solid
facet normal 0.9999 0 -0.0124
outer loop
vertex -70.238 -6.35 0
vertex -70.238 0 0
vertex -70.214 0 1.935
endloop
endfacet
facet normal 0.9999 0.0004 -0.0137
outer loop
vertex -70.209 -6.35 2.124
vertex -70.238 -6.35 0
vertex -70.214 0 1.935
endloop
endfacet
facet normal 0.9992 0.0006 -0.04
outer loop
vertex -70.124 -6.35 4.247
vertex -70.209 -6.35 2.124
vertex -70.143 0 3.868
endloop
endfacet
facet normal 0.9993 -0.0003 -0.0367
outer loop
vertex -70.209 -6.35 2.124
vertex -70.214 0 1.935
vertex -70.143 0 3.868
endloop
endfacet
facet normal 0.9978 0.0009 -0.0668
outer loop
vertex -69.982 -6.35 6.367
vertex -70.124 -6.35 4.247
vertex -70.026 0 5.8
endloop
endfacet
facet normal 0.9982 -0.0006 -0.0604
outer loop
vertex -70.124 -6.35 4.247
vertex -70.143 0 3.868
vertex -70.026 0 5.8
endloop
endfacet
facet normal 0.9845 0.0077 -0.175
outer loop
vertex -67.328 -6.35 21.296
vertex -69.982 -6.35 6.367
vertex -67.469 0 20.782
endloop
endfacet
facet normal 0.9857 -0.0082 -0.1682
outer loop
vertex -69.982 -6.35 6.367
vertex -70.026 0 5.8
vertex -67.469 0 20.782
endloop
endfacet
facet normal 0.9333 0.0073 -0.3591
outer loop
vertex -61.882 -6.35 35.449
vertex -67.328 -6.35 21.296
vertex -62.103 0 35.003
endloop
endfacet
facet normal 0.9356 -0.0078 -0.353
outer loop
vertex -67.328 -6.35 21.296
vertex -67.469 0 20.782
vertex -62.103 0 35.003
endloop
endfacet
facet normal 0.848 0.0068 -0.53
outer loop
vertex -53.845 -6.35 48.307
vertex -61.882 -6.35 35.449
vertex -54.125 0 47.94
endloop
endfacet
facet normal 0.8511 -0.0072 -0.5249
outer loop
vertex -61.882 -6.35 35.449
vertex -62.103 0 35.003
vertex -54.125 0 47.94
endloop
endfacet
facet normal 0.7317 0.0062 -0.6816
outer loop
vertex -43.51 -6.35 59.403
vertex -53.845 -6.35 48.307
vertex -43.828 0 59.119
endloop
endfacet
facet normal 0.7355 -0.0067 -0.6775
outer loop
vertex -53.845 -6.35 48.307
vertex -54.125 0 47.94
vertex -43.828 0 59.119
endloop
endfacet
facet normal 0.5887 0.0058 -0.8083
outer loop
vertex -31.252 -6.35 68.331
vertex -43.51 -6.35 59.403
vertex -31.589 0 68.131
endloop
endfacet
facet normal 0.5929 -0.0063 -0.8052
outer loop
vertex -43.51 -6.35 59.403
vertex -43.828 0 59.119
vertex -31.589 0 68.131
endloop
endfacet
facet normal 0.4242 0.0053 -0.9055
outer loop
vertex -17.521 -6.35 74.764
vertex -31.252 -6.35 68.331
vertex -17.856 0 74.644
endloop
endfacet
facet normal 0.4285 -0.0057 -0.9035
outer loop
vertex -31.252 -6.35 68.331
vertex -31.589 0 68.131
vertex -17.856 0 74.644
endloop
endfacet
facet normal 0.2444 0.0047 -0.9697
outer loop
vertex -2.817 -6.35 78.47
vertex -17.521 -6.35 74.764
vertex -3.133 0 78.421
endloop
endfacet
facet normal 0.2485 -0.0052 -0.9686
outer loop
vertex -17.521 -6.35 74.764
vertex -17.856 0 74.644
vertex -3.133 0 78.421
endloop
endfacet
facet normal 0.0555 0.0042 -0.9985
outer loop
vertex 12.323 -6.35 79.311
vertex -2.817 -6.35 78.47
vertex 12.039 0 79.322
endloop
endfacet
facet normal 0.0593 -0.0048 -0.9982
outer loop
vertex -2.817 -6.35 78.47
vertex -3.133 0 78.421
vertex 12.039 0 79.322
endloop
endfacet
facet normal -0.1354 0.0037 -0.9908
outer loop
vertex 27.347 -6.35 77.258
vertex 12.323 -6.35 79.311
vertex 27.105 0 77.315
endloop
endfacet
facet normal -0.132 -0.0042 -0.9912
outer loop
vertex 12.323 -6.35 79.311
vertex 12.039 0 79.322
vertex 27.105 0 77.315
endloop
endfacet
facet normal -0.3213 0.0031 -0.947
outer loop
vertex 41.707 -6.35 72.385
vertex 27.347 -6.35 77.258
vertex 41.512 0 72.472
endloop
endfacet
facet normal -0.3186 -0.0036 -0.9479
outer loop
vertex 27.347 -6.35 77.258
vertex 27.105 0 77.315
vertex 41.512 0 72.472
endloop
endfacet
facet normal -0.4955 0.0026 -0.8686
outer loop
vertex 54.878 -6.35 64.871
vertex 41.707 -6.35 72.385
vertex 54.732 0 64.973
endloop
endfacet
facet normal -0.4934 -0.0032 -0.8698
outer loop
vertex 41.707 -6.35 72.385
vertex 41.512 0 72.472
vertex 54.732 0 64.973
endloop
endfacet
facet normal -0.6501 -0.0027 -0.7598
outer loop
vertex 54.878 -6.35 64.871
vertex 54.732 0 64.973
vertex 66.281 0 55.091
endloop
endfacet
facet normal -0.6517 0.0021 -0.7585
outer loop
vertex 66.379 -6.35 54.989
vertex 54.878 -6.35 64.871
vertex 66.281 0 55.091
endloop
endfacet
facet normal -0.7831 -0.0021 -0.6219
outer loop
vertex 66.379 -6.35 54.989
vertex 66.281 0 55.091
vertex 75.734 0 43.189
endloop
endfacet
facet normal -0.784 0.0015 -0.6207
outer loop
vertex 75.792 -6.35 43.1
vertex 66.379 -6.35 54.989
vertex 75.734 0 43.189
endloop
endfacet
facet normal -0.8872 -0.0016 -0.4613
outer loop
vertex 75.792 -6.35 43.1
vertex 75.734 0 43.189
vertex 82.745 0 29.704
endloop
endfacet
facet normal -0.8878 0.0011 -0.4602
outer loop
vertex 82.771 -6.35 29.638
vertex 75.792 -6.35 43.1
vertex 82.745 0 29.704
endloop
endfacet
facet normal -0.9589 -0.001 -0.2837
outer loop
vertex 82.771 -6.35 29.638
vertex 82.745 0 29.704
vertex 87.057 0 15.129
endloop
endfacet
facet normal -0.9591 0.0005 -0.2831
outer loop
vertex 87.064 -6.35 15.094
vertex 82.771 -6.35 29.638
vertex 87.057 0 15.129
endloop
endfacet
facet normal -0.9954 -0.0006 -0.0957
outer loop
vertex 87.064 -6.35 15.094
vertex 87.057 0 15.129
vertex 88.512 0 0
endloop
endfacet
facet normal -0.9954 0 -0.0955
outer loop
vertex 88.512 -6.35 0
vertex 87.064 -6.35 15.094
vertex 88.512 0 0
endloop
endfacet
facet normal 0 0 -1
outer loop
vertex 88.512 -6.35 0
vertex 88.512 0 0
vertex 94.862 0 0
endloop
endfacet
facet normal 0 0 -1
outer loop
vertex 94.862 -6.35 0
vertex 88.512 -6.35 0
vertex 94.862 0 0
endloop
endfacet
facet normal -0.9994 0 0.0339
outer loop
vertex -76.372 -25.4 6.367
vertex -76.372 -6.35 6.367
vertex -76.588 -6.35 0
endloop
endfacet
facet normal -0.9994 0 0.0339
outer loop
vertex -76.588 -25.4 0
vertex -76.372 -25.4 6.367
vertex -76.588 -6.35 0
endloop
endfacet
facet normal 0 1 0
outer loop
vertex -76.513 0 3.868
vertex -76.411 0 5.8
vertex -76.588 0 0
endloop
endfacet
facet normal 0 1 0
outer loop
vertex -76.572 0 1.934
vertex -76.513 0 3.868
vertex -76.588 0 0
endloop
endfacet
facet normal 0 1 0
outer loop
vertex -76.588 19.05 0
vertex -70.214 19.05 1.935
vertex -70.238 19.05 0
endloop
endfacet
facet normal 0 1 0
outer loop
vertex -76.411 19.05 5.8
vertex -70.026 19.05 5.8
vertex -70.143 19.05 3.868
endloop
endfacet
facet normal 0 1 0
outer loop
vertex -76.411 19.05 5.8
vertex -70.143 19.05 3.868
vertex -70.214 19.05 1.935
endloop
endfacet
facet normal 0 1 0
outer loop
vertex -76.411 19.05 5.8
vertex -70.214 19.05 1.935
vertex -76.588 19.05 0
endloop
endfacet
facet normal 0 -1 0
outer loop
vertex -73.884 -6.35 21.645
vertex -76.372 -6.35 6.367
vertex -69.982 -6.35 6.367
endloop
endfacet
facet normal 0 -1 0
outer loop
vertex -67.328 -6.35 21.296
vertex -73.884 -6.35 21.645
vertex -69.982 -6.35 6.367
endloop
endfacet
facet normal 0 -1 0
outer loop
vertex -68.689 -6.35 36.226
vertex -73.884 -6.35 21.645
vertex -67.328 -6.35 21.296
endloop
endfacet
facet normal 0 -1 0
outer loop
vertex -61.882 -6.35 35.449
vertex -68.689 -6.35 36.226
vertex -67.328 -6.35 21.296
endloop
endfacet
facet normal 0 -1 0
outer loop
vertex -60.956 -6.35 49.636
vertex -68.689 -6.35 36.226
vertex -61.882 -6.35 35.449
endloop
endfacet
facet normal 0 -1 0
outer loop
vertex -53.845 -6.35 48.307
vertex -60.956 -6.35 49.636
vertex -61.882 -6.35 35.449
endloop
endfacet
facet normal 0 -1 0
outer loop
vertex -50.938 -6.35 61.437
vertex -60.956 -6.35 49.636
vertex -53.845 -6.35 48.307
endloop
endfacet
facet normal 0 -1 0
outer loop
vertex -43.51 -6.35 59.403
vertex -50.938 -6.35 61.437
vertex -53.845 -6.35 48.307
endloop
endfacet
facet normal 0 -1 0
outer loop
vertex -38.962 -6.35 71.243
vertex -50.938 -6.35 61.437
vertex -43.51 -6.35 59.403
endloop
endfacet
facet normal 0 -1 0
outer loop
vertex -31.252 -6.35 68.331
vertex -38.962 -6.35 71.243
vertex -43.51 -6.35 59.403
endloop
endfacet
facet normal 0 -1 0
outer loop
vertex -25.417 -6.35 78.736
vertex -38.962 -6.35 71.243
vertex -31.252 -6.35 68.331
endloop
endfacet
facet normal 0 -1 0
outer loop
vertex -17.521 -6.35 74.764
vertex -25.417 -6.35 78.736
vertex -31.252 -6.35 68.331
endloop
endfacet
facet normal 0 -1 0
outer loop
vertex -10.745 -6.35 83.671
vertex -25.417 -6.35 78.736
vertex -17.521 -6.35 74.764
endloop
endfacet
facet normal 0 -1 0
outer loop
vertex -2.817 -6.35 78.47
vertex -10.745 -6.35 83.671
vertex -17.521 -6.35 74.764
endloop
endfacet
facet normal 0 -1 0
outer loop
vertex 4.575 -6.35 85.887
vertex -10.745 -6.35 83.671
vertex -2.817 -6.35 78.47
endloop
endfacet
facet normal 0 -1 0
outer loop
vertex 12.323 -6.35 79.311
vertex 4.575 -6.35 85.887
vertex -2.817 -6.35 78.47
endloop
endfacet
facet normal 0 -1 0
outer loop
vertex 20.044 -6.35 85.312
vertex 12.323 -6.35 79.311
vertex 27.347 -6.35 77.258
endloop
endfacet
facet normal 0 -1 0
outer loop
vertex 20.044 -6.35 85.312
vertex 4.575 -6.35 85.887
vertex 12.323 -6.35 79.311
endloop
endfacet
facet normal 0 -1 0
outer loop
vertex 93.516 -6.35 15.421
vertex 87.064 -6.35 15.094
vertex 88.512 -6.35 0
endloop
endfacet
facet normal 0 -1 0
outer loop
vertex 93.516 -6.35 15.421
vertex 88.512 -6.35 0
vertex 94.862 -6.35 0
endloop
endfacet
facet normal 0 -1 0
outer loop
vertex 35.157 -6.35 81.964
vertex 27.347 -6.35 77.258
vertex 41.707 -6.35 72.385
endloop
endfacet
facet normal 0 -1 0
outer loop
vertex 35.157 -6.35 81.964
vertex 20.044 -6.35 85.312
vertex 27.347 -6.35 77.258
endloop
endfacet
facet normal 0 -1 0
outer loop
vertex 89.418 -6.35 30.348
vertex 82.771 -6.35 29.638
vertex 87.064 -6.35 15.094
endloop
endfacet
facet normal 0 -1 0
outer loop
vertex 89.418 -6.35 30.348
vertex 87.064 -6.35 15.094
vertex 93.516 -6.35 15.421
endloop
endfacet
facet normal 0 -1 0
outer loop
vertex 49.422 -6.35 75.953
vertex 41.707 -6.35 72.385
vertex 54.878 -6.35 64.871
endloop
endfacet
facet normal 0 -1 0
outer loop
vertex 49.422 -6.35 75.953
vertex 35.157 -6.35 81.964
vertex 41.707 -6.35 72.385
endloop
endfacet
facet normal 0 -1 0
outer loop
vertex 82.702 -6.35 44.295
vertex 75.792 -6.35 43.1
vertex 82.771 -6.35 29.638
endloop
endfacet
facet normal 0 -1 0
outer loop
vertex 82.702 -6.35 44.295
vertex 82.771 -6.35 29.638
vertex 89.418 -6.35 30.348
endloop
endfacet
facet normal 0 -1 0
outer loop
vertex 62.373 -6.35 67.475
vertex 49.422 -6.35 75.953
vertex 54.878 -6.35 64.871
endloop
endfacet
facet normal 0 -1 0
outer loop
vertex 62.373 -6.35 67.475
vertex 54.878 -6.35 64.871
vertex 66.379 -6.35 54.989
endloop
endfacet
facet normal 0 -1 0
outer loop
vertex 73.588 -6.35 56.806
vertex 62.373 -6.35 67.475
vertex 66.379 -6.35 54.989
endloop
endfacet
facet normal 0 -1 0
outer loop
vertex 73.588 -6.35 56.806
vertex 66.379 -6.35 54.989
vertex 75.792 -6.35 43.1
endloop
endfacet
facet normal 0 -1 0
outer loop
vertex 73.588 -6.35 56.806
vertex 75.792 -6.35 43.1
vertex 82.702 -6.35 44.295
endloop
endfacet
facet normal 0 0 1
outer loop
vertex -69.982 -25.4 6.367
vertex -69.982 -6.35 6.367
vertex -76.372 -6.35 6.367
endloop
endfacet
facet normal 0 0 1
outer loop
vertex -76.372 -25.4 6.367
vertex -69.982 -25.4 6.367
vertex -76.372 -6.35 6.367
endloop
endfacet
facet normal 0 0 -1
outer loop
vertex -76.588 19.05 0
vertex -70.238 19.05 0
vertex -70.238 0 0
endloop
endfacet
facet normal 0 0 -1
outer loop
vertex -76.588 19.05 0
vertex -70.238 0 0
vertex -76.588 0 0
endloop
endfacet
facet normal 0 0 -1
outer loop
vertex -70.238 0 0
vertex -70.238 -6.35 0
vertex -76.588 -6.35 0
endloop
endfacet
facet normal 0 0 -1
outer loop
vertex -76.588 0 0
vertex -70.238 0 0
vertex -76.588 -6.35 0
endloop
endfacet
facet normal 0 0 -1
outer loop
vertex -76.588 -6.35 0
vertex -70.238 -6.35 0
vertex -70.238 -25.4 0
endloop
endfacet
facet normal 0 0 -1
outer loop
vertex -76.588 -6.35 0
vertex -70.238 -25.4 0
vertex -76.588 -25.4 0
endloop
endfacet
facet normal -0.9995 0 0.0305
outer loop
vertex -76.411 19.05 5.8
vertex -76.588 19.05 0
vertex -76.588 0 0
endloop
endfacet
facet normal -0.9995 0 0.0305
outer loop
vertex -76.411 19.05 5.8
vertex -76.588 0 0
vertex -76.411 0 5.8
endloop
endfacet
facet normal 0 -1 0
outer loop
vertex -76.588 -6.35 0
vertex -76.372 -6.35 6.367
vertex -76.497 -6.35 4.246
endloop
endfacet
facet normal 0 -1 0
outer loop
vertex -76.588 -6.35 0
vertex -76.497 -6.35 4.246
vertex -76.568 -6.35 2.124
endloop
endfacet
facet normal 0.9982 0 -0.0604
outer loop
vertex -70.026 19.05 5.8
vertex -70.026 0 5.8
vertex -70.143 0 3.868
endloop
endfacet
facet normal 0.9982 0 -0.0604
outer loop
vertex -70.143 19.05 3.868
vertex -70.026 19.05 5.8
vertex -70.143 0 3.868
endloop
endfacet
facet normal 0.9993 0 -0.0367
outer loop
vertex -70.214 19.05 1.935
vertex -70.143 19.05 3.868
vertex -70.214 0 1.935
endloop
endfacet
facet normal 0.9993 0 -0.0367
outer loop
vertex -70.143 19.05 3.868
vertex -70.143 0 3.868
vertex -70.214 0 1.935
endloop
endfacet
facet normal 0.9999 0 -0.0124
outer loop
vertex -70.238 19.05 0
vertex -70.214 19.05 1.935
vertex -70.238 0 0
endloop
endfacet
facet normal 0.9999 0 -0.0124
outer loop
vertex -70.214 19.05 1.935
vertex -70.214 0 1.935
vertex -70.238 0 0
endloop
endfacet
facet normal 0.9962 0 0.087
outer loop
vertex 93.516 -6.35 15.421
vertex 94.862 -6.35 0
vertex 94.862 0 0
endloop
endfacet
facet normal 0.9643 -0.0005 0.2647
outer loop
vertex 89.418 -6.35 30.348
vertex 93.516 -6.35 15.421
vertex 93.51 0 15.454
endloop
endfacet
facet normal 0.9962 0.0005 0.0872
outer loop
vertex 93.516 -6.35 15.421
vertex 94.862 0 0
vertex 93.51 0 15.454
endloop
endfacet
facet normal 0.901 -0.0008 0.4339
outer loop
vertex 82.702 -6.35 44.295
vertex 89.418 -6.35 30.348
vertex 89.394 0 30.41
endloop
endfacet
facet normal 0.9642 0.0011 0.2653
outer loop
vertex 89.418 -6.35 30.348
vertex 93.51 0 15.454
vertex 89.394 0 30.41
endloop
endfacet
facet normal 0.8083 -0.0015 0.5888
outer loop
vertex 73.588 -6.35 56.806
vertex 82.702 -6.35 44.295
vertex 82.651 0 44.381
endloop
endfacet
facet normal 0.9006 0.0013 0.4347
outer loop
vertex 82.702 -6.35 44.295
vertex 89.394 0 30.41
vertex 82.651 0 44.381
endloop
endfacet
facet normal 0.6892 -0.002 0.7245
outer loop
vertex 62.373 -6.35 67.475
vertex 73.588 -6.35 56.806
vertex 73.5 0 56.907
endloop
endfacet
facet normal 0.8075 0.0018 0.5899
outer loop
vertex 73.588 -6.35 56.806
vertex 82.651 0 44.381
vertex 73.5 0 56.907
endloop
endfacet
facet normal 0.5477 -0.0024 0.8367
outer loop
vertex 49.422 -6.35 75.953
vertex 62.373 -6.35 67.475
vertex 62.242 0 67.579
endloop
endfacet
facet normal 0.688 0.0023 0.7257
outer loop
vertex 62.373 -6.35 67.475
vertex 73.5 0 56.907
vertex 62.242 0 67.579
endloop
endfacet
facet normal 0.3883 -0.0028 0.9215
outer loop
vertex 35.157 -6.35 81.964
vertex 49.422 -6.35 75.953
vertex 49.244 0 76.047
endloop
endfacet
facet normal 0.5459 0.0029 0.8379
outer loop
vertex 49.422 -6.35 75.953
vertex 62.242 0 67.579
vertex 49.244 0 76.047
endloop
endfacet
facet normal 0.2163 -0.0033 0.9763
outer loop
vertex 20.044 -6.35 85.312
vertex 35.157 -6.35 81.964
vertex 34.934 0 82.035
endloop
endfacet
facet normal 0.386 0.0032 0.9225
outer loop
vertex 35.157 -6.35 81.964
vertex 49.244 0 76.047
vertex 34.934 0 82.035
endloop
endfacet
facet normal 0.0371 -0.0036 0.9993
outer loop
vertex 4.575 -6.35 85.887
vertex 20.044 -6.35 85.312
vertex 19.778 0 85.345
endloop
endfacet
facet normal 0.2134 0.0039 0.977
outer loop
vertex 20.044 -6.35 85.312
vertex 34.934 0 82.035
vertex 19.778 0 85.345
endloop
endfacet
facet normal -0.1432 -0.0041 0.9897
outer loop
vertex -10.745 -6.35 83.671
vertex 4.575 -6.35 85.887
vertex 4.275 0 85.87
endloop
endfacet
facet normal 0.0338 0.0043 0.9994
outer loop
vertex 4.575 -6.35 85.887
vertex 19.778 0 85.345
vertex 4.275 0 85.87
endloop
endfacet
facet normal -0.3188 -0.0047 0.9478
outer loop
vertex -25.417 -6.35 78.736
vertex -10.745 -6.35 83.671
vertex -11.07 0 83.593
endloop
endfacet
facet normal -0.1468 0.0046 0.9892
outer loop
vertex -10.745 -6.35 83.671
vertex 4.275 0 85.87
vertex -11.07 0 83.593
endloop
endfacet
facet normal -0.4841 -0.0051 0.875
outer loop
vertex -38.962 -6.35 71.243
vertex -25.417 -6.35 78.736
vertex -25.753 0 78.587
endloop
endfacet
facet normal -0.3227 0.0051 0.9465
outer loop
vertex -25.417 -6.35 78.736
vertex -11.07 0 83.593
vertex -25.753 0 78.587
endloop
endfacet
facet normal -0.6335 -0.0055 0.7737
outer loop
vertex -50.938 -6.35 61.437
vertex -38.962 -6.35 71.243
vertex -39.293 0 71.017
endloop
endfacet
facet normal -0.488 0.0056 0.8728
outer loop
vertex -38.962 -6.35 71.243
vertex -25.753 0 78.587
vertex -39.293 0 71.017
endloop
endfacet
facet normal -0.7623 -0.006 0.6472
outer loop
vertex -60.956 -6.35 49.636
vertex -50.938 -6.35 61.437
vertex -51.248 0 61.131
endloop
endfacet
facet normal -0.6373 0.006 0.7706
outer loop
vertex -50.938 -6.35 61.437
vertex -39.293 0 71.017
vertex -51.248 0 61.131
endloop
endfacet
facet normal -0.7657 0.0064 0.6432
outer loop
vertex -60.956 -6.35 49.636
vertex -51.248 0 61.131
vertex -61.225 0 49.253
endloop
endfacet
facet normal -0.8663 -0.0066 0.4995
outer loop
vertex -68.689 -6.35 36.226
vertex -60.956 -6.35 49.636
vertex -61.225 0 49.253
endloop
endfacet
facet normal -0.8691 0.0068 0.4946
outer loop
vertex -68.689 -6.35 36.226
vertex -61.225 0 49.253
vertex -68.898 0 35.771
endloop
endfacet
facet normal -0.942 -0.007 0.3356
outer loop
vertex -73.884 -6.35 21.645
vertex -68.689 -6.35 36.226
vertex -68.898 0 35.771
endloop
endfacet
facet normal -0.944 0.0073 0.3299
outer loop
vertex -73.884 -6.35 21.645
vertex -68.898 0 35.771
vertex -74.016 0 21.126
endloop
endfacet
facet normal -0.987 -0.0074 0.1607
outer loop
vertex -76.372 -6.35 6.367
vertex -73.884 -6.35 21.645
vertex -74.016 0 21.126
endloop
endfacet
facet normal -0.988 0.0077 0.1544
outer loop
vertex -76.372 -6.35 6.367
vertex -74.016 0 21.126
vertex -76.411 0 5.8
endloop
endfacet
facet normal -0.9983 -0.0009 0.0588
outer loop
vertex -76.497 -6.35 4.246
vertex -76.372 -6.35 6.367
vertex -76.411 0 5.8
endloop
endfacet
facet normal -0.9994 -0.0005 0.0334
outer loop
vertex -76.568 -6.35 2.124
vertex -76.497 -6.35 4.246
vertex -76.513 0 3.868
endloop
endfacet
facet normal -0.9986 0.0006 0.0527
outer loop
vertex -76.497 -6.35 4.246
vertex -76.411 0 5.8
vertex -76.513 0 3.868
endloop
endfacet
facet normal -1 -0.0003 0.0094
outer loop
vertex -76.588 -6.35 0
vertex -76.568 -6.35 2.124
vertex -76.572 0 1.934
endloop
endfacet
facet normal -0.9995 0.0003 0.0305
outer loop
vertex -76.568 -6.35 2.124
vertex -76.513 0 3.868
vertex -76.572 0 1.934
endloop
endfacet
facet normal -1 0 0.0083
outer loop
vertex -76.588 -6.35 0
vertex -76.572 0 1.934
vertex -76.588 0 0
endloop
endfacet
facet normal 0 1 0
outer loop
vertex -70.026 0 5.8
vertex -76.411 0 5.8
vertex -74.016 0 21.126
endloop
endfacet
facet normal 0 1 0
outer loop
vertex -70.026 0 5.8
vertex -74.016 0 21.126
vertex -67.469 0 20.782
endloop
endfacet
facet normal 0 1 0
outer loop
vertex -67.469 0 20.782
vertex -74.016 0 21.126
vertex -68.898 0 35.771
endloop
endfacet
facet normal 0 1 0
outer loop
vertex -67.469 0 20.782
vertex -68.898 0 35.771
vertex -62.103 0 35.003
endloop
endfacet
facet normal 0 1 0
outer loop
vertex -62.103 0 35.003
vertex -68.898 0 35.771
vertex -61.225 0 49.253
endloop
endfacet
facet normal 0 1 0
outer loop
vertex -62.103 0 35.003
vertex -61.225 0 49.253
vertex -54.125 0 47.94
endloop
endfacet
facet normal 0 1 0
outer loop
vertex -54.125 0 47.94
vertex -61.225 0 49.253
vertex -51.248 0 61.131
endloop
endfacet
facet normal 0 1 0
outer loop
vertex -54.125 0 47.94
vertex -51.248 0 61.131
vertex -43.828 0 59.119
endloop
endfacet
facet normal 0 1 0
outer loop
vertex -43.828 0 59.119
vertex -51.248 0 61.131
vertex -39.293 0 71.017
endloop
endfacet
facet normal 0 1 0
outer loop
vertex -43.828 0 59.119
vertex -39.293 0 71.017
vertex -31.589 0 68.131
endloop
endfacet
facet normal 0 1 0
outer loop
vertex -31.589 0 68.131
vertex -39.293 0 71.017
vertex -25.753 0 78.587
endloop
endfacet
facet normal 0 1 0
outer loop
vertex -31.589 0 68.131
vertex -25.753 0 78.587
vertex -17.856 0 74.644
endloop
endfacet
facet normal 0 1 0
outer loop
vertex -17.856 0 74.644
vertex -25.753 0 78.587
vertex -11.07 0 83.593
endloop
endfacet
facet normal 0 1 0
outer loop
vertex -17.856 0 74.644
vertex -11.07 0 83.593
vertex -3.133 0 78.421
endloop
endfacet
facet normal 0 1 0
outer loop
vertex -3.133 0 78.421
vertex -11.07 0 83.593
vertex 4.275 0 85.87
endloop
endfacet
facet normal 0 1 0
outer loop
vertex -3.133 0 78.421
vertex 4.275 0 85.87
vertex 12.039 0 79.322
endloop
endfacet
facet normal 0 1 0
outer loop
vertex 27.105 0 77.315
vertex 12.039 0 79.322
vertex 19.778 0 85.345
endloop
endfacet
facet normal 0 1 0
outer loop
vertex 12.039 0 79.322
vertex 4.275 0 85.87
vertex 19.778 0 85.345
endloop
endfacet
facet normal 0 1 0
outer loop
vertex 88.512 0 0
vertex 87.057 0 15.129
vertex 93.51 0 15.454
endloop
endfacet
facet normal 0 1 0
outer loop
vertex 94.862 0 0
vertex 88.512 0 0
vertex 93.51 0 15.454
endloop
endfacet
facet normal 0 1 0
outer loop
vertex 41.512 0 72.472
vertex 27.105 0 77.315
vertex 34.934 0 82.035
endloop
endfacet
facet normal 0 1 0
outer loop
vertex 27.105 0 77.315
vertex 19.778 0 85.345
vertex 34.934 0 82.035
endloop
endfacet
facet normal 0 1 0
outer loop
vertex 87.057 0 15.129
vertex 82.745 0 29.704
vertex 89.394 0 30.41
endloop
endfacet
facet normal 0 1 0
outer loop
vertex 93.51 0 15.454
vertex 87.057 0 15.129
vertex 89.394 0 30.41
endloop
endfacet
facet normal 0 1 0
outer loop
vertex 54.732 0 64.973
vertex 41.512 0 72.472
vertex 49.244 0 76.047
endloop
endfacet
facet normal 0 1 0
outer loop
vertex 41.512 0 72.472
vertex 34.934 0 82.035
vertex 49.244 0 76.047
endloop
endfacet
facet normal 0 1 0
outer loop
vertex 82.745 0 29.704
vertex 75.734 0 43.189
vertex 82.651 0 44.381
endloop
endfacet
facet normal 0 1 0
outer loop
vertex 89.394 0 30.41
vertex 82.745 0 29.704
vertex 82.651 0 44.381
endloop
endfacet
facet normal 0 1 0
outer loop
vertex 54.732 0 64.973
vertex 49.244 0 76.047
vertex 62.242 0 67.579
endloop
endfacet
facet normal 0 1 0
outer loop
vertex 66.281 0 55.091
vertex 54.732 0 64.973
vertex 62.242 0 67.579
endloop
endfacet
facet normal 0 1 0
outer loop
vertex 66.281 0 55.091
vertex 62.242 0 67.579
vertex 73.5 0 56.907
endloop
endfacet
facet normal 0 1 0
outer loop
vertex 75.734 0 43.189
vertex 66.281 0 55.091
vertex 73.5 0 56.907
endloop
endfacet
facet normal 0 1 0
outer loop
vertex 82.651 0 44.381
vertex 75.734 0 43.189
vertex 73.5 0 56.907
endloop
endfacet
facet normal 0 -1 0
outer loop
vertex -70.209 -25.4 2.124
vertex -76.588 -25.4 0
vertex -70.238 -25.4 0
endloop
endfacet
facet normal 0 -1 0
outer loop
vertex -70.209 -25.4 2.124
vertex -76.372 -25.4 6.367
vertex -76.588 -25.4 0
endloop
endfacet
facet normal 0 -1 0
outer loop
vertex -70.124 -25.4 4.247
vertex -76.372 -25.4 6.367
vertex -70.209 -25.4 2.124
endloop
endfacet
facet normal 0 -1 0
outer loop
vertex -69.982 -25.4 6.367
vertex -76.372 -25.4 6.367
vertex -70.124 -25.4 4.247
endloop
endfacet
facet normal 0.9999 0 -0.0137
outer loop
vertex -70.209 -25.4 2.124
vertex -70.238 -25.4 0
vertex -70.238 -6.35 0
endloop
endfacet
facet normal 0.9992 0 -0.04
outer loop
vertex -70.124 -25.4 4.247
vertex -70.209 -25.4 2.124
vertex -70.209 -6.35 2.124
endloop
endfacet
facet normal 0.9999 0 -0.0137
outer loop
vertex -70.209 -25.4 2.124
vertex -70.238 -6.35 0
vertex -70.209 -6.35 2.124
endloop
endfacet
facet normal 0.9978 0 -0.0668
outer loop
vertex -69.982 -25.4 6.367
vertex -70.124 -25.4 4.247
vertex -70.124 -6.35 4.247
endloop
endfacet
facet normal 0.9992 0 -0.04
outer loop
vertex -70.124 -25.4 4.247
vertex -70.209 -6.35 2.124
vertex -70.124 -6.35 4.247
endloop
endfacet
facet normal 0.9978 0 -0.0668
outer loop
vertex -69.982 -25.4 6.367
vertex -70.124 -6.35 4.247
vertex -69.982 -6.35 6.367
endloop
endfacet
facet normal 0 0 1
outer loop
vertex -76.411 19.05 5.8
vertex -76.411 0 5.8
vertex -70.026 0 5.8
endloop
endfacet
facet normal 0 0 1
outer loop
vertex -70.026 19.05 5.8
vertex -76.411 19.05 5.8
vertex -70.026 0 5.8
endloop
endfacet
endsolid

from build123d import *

# Parameters (mm, degrees)
F1_DEPTH = 6.35
F3_DEPTH = 19.05
F5_DEPTH = 19.05


with BuildPart() as f1:
    # F0 (on Front) → F1 (new body)
    with BuildSketch(Plane.XZ):
        with BuildLine():
            ThreePointArc((-70.237749294, 0), (9.137250706, 79.375), (88.512250706, 0))
            Line((88.512250706, 0), (94.862250706, 0))
            ThreePointArc((94.862250706, 0), (9.137250706, 86.0083166132), (-76.587749294, 0))
            Line((-76.587749294, 0), (-70.237749294, 0))
        make_face()
    extrude(amount=F1_DEPTH)

    # F2 (on face) → F3 (join)
    with BuildSketch(Plane.XZ.offset(6.35)):
        with BuildLine():
            Line((-76.587749294, 0), (-70.237749294, 0))
            ThreePointArc((-70.237749294, 0), (-70.1737860692, 3.1859175505), (-69.9819994827, 6.3667004474))
            Line((-69.9819994827, 6.3667004474), (-76.3720610245, 6.3667004474))
            Line((-76.3720610245, 6.3667004474), (-76.587749294, 0))
        make_face()
    extrude(amount=F3_DEPTH)

    # F4 (on face) → F5 (join)
    with BuildSketch(Plane(origin=(0, 0, 0), x_dir=(-1, 0, 0), z_dir=(0, 1, 0))):
        with BuildLine():
            ThreePointArc((70.0255849548, 5.7996616405), (70.1846904754, 2.9017705307), (70.237749294, 0))
            Line((70.237749294, 0), (76.587749294, 0))
            Line((76.587749294, 0), (76.4105161745, 5.7996616405))
            Line((76.4105161745, 5.7996616405), (70.0255849548, 5.7996616405))
        make_face()
    extrude(amount=F5_DEPTH)


solid = f1.part
